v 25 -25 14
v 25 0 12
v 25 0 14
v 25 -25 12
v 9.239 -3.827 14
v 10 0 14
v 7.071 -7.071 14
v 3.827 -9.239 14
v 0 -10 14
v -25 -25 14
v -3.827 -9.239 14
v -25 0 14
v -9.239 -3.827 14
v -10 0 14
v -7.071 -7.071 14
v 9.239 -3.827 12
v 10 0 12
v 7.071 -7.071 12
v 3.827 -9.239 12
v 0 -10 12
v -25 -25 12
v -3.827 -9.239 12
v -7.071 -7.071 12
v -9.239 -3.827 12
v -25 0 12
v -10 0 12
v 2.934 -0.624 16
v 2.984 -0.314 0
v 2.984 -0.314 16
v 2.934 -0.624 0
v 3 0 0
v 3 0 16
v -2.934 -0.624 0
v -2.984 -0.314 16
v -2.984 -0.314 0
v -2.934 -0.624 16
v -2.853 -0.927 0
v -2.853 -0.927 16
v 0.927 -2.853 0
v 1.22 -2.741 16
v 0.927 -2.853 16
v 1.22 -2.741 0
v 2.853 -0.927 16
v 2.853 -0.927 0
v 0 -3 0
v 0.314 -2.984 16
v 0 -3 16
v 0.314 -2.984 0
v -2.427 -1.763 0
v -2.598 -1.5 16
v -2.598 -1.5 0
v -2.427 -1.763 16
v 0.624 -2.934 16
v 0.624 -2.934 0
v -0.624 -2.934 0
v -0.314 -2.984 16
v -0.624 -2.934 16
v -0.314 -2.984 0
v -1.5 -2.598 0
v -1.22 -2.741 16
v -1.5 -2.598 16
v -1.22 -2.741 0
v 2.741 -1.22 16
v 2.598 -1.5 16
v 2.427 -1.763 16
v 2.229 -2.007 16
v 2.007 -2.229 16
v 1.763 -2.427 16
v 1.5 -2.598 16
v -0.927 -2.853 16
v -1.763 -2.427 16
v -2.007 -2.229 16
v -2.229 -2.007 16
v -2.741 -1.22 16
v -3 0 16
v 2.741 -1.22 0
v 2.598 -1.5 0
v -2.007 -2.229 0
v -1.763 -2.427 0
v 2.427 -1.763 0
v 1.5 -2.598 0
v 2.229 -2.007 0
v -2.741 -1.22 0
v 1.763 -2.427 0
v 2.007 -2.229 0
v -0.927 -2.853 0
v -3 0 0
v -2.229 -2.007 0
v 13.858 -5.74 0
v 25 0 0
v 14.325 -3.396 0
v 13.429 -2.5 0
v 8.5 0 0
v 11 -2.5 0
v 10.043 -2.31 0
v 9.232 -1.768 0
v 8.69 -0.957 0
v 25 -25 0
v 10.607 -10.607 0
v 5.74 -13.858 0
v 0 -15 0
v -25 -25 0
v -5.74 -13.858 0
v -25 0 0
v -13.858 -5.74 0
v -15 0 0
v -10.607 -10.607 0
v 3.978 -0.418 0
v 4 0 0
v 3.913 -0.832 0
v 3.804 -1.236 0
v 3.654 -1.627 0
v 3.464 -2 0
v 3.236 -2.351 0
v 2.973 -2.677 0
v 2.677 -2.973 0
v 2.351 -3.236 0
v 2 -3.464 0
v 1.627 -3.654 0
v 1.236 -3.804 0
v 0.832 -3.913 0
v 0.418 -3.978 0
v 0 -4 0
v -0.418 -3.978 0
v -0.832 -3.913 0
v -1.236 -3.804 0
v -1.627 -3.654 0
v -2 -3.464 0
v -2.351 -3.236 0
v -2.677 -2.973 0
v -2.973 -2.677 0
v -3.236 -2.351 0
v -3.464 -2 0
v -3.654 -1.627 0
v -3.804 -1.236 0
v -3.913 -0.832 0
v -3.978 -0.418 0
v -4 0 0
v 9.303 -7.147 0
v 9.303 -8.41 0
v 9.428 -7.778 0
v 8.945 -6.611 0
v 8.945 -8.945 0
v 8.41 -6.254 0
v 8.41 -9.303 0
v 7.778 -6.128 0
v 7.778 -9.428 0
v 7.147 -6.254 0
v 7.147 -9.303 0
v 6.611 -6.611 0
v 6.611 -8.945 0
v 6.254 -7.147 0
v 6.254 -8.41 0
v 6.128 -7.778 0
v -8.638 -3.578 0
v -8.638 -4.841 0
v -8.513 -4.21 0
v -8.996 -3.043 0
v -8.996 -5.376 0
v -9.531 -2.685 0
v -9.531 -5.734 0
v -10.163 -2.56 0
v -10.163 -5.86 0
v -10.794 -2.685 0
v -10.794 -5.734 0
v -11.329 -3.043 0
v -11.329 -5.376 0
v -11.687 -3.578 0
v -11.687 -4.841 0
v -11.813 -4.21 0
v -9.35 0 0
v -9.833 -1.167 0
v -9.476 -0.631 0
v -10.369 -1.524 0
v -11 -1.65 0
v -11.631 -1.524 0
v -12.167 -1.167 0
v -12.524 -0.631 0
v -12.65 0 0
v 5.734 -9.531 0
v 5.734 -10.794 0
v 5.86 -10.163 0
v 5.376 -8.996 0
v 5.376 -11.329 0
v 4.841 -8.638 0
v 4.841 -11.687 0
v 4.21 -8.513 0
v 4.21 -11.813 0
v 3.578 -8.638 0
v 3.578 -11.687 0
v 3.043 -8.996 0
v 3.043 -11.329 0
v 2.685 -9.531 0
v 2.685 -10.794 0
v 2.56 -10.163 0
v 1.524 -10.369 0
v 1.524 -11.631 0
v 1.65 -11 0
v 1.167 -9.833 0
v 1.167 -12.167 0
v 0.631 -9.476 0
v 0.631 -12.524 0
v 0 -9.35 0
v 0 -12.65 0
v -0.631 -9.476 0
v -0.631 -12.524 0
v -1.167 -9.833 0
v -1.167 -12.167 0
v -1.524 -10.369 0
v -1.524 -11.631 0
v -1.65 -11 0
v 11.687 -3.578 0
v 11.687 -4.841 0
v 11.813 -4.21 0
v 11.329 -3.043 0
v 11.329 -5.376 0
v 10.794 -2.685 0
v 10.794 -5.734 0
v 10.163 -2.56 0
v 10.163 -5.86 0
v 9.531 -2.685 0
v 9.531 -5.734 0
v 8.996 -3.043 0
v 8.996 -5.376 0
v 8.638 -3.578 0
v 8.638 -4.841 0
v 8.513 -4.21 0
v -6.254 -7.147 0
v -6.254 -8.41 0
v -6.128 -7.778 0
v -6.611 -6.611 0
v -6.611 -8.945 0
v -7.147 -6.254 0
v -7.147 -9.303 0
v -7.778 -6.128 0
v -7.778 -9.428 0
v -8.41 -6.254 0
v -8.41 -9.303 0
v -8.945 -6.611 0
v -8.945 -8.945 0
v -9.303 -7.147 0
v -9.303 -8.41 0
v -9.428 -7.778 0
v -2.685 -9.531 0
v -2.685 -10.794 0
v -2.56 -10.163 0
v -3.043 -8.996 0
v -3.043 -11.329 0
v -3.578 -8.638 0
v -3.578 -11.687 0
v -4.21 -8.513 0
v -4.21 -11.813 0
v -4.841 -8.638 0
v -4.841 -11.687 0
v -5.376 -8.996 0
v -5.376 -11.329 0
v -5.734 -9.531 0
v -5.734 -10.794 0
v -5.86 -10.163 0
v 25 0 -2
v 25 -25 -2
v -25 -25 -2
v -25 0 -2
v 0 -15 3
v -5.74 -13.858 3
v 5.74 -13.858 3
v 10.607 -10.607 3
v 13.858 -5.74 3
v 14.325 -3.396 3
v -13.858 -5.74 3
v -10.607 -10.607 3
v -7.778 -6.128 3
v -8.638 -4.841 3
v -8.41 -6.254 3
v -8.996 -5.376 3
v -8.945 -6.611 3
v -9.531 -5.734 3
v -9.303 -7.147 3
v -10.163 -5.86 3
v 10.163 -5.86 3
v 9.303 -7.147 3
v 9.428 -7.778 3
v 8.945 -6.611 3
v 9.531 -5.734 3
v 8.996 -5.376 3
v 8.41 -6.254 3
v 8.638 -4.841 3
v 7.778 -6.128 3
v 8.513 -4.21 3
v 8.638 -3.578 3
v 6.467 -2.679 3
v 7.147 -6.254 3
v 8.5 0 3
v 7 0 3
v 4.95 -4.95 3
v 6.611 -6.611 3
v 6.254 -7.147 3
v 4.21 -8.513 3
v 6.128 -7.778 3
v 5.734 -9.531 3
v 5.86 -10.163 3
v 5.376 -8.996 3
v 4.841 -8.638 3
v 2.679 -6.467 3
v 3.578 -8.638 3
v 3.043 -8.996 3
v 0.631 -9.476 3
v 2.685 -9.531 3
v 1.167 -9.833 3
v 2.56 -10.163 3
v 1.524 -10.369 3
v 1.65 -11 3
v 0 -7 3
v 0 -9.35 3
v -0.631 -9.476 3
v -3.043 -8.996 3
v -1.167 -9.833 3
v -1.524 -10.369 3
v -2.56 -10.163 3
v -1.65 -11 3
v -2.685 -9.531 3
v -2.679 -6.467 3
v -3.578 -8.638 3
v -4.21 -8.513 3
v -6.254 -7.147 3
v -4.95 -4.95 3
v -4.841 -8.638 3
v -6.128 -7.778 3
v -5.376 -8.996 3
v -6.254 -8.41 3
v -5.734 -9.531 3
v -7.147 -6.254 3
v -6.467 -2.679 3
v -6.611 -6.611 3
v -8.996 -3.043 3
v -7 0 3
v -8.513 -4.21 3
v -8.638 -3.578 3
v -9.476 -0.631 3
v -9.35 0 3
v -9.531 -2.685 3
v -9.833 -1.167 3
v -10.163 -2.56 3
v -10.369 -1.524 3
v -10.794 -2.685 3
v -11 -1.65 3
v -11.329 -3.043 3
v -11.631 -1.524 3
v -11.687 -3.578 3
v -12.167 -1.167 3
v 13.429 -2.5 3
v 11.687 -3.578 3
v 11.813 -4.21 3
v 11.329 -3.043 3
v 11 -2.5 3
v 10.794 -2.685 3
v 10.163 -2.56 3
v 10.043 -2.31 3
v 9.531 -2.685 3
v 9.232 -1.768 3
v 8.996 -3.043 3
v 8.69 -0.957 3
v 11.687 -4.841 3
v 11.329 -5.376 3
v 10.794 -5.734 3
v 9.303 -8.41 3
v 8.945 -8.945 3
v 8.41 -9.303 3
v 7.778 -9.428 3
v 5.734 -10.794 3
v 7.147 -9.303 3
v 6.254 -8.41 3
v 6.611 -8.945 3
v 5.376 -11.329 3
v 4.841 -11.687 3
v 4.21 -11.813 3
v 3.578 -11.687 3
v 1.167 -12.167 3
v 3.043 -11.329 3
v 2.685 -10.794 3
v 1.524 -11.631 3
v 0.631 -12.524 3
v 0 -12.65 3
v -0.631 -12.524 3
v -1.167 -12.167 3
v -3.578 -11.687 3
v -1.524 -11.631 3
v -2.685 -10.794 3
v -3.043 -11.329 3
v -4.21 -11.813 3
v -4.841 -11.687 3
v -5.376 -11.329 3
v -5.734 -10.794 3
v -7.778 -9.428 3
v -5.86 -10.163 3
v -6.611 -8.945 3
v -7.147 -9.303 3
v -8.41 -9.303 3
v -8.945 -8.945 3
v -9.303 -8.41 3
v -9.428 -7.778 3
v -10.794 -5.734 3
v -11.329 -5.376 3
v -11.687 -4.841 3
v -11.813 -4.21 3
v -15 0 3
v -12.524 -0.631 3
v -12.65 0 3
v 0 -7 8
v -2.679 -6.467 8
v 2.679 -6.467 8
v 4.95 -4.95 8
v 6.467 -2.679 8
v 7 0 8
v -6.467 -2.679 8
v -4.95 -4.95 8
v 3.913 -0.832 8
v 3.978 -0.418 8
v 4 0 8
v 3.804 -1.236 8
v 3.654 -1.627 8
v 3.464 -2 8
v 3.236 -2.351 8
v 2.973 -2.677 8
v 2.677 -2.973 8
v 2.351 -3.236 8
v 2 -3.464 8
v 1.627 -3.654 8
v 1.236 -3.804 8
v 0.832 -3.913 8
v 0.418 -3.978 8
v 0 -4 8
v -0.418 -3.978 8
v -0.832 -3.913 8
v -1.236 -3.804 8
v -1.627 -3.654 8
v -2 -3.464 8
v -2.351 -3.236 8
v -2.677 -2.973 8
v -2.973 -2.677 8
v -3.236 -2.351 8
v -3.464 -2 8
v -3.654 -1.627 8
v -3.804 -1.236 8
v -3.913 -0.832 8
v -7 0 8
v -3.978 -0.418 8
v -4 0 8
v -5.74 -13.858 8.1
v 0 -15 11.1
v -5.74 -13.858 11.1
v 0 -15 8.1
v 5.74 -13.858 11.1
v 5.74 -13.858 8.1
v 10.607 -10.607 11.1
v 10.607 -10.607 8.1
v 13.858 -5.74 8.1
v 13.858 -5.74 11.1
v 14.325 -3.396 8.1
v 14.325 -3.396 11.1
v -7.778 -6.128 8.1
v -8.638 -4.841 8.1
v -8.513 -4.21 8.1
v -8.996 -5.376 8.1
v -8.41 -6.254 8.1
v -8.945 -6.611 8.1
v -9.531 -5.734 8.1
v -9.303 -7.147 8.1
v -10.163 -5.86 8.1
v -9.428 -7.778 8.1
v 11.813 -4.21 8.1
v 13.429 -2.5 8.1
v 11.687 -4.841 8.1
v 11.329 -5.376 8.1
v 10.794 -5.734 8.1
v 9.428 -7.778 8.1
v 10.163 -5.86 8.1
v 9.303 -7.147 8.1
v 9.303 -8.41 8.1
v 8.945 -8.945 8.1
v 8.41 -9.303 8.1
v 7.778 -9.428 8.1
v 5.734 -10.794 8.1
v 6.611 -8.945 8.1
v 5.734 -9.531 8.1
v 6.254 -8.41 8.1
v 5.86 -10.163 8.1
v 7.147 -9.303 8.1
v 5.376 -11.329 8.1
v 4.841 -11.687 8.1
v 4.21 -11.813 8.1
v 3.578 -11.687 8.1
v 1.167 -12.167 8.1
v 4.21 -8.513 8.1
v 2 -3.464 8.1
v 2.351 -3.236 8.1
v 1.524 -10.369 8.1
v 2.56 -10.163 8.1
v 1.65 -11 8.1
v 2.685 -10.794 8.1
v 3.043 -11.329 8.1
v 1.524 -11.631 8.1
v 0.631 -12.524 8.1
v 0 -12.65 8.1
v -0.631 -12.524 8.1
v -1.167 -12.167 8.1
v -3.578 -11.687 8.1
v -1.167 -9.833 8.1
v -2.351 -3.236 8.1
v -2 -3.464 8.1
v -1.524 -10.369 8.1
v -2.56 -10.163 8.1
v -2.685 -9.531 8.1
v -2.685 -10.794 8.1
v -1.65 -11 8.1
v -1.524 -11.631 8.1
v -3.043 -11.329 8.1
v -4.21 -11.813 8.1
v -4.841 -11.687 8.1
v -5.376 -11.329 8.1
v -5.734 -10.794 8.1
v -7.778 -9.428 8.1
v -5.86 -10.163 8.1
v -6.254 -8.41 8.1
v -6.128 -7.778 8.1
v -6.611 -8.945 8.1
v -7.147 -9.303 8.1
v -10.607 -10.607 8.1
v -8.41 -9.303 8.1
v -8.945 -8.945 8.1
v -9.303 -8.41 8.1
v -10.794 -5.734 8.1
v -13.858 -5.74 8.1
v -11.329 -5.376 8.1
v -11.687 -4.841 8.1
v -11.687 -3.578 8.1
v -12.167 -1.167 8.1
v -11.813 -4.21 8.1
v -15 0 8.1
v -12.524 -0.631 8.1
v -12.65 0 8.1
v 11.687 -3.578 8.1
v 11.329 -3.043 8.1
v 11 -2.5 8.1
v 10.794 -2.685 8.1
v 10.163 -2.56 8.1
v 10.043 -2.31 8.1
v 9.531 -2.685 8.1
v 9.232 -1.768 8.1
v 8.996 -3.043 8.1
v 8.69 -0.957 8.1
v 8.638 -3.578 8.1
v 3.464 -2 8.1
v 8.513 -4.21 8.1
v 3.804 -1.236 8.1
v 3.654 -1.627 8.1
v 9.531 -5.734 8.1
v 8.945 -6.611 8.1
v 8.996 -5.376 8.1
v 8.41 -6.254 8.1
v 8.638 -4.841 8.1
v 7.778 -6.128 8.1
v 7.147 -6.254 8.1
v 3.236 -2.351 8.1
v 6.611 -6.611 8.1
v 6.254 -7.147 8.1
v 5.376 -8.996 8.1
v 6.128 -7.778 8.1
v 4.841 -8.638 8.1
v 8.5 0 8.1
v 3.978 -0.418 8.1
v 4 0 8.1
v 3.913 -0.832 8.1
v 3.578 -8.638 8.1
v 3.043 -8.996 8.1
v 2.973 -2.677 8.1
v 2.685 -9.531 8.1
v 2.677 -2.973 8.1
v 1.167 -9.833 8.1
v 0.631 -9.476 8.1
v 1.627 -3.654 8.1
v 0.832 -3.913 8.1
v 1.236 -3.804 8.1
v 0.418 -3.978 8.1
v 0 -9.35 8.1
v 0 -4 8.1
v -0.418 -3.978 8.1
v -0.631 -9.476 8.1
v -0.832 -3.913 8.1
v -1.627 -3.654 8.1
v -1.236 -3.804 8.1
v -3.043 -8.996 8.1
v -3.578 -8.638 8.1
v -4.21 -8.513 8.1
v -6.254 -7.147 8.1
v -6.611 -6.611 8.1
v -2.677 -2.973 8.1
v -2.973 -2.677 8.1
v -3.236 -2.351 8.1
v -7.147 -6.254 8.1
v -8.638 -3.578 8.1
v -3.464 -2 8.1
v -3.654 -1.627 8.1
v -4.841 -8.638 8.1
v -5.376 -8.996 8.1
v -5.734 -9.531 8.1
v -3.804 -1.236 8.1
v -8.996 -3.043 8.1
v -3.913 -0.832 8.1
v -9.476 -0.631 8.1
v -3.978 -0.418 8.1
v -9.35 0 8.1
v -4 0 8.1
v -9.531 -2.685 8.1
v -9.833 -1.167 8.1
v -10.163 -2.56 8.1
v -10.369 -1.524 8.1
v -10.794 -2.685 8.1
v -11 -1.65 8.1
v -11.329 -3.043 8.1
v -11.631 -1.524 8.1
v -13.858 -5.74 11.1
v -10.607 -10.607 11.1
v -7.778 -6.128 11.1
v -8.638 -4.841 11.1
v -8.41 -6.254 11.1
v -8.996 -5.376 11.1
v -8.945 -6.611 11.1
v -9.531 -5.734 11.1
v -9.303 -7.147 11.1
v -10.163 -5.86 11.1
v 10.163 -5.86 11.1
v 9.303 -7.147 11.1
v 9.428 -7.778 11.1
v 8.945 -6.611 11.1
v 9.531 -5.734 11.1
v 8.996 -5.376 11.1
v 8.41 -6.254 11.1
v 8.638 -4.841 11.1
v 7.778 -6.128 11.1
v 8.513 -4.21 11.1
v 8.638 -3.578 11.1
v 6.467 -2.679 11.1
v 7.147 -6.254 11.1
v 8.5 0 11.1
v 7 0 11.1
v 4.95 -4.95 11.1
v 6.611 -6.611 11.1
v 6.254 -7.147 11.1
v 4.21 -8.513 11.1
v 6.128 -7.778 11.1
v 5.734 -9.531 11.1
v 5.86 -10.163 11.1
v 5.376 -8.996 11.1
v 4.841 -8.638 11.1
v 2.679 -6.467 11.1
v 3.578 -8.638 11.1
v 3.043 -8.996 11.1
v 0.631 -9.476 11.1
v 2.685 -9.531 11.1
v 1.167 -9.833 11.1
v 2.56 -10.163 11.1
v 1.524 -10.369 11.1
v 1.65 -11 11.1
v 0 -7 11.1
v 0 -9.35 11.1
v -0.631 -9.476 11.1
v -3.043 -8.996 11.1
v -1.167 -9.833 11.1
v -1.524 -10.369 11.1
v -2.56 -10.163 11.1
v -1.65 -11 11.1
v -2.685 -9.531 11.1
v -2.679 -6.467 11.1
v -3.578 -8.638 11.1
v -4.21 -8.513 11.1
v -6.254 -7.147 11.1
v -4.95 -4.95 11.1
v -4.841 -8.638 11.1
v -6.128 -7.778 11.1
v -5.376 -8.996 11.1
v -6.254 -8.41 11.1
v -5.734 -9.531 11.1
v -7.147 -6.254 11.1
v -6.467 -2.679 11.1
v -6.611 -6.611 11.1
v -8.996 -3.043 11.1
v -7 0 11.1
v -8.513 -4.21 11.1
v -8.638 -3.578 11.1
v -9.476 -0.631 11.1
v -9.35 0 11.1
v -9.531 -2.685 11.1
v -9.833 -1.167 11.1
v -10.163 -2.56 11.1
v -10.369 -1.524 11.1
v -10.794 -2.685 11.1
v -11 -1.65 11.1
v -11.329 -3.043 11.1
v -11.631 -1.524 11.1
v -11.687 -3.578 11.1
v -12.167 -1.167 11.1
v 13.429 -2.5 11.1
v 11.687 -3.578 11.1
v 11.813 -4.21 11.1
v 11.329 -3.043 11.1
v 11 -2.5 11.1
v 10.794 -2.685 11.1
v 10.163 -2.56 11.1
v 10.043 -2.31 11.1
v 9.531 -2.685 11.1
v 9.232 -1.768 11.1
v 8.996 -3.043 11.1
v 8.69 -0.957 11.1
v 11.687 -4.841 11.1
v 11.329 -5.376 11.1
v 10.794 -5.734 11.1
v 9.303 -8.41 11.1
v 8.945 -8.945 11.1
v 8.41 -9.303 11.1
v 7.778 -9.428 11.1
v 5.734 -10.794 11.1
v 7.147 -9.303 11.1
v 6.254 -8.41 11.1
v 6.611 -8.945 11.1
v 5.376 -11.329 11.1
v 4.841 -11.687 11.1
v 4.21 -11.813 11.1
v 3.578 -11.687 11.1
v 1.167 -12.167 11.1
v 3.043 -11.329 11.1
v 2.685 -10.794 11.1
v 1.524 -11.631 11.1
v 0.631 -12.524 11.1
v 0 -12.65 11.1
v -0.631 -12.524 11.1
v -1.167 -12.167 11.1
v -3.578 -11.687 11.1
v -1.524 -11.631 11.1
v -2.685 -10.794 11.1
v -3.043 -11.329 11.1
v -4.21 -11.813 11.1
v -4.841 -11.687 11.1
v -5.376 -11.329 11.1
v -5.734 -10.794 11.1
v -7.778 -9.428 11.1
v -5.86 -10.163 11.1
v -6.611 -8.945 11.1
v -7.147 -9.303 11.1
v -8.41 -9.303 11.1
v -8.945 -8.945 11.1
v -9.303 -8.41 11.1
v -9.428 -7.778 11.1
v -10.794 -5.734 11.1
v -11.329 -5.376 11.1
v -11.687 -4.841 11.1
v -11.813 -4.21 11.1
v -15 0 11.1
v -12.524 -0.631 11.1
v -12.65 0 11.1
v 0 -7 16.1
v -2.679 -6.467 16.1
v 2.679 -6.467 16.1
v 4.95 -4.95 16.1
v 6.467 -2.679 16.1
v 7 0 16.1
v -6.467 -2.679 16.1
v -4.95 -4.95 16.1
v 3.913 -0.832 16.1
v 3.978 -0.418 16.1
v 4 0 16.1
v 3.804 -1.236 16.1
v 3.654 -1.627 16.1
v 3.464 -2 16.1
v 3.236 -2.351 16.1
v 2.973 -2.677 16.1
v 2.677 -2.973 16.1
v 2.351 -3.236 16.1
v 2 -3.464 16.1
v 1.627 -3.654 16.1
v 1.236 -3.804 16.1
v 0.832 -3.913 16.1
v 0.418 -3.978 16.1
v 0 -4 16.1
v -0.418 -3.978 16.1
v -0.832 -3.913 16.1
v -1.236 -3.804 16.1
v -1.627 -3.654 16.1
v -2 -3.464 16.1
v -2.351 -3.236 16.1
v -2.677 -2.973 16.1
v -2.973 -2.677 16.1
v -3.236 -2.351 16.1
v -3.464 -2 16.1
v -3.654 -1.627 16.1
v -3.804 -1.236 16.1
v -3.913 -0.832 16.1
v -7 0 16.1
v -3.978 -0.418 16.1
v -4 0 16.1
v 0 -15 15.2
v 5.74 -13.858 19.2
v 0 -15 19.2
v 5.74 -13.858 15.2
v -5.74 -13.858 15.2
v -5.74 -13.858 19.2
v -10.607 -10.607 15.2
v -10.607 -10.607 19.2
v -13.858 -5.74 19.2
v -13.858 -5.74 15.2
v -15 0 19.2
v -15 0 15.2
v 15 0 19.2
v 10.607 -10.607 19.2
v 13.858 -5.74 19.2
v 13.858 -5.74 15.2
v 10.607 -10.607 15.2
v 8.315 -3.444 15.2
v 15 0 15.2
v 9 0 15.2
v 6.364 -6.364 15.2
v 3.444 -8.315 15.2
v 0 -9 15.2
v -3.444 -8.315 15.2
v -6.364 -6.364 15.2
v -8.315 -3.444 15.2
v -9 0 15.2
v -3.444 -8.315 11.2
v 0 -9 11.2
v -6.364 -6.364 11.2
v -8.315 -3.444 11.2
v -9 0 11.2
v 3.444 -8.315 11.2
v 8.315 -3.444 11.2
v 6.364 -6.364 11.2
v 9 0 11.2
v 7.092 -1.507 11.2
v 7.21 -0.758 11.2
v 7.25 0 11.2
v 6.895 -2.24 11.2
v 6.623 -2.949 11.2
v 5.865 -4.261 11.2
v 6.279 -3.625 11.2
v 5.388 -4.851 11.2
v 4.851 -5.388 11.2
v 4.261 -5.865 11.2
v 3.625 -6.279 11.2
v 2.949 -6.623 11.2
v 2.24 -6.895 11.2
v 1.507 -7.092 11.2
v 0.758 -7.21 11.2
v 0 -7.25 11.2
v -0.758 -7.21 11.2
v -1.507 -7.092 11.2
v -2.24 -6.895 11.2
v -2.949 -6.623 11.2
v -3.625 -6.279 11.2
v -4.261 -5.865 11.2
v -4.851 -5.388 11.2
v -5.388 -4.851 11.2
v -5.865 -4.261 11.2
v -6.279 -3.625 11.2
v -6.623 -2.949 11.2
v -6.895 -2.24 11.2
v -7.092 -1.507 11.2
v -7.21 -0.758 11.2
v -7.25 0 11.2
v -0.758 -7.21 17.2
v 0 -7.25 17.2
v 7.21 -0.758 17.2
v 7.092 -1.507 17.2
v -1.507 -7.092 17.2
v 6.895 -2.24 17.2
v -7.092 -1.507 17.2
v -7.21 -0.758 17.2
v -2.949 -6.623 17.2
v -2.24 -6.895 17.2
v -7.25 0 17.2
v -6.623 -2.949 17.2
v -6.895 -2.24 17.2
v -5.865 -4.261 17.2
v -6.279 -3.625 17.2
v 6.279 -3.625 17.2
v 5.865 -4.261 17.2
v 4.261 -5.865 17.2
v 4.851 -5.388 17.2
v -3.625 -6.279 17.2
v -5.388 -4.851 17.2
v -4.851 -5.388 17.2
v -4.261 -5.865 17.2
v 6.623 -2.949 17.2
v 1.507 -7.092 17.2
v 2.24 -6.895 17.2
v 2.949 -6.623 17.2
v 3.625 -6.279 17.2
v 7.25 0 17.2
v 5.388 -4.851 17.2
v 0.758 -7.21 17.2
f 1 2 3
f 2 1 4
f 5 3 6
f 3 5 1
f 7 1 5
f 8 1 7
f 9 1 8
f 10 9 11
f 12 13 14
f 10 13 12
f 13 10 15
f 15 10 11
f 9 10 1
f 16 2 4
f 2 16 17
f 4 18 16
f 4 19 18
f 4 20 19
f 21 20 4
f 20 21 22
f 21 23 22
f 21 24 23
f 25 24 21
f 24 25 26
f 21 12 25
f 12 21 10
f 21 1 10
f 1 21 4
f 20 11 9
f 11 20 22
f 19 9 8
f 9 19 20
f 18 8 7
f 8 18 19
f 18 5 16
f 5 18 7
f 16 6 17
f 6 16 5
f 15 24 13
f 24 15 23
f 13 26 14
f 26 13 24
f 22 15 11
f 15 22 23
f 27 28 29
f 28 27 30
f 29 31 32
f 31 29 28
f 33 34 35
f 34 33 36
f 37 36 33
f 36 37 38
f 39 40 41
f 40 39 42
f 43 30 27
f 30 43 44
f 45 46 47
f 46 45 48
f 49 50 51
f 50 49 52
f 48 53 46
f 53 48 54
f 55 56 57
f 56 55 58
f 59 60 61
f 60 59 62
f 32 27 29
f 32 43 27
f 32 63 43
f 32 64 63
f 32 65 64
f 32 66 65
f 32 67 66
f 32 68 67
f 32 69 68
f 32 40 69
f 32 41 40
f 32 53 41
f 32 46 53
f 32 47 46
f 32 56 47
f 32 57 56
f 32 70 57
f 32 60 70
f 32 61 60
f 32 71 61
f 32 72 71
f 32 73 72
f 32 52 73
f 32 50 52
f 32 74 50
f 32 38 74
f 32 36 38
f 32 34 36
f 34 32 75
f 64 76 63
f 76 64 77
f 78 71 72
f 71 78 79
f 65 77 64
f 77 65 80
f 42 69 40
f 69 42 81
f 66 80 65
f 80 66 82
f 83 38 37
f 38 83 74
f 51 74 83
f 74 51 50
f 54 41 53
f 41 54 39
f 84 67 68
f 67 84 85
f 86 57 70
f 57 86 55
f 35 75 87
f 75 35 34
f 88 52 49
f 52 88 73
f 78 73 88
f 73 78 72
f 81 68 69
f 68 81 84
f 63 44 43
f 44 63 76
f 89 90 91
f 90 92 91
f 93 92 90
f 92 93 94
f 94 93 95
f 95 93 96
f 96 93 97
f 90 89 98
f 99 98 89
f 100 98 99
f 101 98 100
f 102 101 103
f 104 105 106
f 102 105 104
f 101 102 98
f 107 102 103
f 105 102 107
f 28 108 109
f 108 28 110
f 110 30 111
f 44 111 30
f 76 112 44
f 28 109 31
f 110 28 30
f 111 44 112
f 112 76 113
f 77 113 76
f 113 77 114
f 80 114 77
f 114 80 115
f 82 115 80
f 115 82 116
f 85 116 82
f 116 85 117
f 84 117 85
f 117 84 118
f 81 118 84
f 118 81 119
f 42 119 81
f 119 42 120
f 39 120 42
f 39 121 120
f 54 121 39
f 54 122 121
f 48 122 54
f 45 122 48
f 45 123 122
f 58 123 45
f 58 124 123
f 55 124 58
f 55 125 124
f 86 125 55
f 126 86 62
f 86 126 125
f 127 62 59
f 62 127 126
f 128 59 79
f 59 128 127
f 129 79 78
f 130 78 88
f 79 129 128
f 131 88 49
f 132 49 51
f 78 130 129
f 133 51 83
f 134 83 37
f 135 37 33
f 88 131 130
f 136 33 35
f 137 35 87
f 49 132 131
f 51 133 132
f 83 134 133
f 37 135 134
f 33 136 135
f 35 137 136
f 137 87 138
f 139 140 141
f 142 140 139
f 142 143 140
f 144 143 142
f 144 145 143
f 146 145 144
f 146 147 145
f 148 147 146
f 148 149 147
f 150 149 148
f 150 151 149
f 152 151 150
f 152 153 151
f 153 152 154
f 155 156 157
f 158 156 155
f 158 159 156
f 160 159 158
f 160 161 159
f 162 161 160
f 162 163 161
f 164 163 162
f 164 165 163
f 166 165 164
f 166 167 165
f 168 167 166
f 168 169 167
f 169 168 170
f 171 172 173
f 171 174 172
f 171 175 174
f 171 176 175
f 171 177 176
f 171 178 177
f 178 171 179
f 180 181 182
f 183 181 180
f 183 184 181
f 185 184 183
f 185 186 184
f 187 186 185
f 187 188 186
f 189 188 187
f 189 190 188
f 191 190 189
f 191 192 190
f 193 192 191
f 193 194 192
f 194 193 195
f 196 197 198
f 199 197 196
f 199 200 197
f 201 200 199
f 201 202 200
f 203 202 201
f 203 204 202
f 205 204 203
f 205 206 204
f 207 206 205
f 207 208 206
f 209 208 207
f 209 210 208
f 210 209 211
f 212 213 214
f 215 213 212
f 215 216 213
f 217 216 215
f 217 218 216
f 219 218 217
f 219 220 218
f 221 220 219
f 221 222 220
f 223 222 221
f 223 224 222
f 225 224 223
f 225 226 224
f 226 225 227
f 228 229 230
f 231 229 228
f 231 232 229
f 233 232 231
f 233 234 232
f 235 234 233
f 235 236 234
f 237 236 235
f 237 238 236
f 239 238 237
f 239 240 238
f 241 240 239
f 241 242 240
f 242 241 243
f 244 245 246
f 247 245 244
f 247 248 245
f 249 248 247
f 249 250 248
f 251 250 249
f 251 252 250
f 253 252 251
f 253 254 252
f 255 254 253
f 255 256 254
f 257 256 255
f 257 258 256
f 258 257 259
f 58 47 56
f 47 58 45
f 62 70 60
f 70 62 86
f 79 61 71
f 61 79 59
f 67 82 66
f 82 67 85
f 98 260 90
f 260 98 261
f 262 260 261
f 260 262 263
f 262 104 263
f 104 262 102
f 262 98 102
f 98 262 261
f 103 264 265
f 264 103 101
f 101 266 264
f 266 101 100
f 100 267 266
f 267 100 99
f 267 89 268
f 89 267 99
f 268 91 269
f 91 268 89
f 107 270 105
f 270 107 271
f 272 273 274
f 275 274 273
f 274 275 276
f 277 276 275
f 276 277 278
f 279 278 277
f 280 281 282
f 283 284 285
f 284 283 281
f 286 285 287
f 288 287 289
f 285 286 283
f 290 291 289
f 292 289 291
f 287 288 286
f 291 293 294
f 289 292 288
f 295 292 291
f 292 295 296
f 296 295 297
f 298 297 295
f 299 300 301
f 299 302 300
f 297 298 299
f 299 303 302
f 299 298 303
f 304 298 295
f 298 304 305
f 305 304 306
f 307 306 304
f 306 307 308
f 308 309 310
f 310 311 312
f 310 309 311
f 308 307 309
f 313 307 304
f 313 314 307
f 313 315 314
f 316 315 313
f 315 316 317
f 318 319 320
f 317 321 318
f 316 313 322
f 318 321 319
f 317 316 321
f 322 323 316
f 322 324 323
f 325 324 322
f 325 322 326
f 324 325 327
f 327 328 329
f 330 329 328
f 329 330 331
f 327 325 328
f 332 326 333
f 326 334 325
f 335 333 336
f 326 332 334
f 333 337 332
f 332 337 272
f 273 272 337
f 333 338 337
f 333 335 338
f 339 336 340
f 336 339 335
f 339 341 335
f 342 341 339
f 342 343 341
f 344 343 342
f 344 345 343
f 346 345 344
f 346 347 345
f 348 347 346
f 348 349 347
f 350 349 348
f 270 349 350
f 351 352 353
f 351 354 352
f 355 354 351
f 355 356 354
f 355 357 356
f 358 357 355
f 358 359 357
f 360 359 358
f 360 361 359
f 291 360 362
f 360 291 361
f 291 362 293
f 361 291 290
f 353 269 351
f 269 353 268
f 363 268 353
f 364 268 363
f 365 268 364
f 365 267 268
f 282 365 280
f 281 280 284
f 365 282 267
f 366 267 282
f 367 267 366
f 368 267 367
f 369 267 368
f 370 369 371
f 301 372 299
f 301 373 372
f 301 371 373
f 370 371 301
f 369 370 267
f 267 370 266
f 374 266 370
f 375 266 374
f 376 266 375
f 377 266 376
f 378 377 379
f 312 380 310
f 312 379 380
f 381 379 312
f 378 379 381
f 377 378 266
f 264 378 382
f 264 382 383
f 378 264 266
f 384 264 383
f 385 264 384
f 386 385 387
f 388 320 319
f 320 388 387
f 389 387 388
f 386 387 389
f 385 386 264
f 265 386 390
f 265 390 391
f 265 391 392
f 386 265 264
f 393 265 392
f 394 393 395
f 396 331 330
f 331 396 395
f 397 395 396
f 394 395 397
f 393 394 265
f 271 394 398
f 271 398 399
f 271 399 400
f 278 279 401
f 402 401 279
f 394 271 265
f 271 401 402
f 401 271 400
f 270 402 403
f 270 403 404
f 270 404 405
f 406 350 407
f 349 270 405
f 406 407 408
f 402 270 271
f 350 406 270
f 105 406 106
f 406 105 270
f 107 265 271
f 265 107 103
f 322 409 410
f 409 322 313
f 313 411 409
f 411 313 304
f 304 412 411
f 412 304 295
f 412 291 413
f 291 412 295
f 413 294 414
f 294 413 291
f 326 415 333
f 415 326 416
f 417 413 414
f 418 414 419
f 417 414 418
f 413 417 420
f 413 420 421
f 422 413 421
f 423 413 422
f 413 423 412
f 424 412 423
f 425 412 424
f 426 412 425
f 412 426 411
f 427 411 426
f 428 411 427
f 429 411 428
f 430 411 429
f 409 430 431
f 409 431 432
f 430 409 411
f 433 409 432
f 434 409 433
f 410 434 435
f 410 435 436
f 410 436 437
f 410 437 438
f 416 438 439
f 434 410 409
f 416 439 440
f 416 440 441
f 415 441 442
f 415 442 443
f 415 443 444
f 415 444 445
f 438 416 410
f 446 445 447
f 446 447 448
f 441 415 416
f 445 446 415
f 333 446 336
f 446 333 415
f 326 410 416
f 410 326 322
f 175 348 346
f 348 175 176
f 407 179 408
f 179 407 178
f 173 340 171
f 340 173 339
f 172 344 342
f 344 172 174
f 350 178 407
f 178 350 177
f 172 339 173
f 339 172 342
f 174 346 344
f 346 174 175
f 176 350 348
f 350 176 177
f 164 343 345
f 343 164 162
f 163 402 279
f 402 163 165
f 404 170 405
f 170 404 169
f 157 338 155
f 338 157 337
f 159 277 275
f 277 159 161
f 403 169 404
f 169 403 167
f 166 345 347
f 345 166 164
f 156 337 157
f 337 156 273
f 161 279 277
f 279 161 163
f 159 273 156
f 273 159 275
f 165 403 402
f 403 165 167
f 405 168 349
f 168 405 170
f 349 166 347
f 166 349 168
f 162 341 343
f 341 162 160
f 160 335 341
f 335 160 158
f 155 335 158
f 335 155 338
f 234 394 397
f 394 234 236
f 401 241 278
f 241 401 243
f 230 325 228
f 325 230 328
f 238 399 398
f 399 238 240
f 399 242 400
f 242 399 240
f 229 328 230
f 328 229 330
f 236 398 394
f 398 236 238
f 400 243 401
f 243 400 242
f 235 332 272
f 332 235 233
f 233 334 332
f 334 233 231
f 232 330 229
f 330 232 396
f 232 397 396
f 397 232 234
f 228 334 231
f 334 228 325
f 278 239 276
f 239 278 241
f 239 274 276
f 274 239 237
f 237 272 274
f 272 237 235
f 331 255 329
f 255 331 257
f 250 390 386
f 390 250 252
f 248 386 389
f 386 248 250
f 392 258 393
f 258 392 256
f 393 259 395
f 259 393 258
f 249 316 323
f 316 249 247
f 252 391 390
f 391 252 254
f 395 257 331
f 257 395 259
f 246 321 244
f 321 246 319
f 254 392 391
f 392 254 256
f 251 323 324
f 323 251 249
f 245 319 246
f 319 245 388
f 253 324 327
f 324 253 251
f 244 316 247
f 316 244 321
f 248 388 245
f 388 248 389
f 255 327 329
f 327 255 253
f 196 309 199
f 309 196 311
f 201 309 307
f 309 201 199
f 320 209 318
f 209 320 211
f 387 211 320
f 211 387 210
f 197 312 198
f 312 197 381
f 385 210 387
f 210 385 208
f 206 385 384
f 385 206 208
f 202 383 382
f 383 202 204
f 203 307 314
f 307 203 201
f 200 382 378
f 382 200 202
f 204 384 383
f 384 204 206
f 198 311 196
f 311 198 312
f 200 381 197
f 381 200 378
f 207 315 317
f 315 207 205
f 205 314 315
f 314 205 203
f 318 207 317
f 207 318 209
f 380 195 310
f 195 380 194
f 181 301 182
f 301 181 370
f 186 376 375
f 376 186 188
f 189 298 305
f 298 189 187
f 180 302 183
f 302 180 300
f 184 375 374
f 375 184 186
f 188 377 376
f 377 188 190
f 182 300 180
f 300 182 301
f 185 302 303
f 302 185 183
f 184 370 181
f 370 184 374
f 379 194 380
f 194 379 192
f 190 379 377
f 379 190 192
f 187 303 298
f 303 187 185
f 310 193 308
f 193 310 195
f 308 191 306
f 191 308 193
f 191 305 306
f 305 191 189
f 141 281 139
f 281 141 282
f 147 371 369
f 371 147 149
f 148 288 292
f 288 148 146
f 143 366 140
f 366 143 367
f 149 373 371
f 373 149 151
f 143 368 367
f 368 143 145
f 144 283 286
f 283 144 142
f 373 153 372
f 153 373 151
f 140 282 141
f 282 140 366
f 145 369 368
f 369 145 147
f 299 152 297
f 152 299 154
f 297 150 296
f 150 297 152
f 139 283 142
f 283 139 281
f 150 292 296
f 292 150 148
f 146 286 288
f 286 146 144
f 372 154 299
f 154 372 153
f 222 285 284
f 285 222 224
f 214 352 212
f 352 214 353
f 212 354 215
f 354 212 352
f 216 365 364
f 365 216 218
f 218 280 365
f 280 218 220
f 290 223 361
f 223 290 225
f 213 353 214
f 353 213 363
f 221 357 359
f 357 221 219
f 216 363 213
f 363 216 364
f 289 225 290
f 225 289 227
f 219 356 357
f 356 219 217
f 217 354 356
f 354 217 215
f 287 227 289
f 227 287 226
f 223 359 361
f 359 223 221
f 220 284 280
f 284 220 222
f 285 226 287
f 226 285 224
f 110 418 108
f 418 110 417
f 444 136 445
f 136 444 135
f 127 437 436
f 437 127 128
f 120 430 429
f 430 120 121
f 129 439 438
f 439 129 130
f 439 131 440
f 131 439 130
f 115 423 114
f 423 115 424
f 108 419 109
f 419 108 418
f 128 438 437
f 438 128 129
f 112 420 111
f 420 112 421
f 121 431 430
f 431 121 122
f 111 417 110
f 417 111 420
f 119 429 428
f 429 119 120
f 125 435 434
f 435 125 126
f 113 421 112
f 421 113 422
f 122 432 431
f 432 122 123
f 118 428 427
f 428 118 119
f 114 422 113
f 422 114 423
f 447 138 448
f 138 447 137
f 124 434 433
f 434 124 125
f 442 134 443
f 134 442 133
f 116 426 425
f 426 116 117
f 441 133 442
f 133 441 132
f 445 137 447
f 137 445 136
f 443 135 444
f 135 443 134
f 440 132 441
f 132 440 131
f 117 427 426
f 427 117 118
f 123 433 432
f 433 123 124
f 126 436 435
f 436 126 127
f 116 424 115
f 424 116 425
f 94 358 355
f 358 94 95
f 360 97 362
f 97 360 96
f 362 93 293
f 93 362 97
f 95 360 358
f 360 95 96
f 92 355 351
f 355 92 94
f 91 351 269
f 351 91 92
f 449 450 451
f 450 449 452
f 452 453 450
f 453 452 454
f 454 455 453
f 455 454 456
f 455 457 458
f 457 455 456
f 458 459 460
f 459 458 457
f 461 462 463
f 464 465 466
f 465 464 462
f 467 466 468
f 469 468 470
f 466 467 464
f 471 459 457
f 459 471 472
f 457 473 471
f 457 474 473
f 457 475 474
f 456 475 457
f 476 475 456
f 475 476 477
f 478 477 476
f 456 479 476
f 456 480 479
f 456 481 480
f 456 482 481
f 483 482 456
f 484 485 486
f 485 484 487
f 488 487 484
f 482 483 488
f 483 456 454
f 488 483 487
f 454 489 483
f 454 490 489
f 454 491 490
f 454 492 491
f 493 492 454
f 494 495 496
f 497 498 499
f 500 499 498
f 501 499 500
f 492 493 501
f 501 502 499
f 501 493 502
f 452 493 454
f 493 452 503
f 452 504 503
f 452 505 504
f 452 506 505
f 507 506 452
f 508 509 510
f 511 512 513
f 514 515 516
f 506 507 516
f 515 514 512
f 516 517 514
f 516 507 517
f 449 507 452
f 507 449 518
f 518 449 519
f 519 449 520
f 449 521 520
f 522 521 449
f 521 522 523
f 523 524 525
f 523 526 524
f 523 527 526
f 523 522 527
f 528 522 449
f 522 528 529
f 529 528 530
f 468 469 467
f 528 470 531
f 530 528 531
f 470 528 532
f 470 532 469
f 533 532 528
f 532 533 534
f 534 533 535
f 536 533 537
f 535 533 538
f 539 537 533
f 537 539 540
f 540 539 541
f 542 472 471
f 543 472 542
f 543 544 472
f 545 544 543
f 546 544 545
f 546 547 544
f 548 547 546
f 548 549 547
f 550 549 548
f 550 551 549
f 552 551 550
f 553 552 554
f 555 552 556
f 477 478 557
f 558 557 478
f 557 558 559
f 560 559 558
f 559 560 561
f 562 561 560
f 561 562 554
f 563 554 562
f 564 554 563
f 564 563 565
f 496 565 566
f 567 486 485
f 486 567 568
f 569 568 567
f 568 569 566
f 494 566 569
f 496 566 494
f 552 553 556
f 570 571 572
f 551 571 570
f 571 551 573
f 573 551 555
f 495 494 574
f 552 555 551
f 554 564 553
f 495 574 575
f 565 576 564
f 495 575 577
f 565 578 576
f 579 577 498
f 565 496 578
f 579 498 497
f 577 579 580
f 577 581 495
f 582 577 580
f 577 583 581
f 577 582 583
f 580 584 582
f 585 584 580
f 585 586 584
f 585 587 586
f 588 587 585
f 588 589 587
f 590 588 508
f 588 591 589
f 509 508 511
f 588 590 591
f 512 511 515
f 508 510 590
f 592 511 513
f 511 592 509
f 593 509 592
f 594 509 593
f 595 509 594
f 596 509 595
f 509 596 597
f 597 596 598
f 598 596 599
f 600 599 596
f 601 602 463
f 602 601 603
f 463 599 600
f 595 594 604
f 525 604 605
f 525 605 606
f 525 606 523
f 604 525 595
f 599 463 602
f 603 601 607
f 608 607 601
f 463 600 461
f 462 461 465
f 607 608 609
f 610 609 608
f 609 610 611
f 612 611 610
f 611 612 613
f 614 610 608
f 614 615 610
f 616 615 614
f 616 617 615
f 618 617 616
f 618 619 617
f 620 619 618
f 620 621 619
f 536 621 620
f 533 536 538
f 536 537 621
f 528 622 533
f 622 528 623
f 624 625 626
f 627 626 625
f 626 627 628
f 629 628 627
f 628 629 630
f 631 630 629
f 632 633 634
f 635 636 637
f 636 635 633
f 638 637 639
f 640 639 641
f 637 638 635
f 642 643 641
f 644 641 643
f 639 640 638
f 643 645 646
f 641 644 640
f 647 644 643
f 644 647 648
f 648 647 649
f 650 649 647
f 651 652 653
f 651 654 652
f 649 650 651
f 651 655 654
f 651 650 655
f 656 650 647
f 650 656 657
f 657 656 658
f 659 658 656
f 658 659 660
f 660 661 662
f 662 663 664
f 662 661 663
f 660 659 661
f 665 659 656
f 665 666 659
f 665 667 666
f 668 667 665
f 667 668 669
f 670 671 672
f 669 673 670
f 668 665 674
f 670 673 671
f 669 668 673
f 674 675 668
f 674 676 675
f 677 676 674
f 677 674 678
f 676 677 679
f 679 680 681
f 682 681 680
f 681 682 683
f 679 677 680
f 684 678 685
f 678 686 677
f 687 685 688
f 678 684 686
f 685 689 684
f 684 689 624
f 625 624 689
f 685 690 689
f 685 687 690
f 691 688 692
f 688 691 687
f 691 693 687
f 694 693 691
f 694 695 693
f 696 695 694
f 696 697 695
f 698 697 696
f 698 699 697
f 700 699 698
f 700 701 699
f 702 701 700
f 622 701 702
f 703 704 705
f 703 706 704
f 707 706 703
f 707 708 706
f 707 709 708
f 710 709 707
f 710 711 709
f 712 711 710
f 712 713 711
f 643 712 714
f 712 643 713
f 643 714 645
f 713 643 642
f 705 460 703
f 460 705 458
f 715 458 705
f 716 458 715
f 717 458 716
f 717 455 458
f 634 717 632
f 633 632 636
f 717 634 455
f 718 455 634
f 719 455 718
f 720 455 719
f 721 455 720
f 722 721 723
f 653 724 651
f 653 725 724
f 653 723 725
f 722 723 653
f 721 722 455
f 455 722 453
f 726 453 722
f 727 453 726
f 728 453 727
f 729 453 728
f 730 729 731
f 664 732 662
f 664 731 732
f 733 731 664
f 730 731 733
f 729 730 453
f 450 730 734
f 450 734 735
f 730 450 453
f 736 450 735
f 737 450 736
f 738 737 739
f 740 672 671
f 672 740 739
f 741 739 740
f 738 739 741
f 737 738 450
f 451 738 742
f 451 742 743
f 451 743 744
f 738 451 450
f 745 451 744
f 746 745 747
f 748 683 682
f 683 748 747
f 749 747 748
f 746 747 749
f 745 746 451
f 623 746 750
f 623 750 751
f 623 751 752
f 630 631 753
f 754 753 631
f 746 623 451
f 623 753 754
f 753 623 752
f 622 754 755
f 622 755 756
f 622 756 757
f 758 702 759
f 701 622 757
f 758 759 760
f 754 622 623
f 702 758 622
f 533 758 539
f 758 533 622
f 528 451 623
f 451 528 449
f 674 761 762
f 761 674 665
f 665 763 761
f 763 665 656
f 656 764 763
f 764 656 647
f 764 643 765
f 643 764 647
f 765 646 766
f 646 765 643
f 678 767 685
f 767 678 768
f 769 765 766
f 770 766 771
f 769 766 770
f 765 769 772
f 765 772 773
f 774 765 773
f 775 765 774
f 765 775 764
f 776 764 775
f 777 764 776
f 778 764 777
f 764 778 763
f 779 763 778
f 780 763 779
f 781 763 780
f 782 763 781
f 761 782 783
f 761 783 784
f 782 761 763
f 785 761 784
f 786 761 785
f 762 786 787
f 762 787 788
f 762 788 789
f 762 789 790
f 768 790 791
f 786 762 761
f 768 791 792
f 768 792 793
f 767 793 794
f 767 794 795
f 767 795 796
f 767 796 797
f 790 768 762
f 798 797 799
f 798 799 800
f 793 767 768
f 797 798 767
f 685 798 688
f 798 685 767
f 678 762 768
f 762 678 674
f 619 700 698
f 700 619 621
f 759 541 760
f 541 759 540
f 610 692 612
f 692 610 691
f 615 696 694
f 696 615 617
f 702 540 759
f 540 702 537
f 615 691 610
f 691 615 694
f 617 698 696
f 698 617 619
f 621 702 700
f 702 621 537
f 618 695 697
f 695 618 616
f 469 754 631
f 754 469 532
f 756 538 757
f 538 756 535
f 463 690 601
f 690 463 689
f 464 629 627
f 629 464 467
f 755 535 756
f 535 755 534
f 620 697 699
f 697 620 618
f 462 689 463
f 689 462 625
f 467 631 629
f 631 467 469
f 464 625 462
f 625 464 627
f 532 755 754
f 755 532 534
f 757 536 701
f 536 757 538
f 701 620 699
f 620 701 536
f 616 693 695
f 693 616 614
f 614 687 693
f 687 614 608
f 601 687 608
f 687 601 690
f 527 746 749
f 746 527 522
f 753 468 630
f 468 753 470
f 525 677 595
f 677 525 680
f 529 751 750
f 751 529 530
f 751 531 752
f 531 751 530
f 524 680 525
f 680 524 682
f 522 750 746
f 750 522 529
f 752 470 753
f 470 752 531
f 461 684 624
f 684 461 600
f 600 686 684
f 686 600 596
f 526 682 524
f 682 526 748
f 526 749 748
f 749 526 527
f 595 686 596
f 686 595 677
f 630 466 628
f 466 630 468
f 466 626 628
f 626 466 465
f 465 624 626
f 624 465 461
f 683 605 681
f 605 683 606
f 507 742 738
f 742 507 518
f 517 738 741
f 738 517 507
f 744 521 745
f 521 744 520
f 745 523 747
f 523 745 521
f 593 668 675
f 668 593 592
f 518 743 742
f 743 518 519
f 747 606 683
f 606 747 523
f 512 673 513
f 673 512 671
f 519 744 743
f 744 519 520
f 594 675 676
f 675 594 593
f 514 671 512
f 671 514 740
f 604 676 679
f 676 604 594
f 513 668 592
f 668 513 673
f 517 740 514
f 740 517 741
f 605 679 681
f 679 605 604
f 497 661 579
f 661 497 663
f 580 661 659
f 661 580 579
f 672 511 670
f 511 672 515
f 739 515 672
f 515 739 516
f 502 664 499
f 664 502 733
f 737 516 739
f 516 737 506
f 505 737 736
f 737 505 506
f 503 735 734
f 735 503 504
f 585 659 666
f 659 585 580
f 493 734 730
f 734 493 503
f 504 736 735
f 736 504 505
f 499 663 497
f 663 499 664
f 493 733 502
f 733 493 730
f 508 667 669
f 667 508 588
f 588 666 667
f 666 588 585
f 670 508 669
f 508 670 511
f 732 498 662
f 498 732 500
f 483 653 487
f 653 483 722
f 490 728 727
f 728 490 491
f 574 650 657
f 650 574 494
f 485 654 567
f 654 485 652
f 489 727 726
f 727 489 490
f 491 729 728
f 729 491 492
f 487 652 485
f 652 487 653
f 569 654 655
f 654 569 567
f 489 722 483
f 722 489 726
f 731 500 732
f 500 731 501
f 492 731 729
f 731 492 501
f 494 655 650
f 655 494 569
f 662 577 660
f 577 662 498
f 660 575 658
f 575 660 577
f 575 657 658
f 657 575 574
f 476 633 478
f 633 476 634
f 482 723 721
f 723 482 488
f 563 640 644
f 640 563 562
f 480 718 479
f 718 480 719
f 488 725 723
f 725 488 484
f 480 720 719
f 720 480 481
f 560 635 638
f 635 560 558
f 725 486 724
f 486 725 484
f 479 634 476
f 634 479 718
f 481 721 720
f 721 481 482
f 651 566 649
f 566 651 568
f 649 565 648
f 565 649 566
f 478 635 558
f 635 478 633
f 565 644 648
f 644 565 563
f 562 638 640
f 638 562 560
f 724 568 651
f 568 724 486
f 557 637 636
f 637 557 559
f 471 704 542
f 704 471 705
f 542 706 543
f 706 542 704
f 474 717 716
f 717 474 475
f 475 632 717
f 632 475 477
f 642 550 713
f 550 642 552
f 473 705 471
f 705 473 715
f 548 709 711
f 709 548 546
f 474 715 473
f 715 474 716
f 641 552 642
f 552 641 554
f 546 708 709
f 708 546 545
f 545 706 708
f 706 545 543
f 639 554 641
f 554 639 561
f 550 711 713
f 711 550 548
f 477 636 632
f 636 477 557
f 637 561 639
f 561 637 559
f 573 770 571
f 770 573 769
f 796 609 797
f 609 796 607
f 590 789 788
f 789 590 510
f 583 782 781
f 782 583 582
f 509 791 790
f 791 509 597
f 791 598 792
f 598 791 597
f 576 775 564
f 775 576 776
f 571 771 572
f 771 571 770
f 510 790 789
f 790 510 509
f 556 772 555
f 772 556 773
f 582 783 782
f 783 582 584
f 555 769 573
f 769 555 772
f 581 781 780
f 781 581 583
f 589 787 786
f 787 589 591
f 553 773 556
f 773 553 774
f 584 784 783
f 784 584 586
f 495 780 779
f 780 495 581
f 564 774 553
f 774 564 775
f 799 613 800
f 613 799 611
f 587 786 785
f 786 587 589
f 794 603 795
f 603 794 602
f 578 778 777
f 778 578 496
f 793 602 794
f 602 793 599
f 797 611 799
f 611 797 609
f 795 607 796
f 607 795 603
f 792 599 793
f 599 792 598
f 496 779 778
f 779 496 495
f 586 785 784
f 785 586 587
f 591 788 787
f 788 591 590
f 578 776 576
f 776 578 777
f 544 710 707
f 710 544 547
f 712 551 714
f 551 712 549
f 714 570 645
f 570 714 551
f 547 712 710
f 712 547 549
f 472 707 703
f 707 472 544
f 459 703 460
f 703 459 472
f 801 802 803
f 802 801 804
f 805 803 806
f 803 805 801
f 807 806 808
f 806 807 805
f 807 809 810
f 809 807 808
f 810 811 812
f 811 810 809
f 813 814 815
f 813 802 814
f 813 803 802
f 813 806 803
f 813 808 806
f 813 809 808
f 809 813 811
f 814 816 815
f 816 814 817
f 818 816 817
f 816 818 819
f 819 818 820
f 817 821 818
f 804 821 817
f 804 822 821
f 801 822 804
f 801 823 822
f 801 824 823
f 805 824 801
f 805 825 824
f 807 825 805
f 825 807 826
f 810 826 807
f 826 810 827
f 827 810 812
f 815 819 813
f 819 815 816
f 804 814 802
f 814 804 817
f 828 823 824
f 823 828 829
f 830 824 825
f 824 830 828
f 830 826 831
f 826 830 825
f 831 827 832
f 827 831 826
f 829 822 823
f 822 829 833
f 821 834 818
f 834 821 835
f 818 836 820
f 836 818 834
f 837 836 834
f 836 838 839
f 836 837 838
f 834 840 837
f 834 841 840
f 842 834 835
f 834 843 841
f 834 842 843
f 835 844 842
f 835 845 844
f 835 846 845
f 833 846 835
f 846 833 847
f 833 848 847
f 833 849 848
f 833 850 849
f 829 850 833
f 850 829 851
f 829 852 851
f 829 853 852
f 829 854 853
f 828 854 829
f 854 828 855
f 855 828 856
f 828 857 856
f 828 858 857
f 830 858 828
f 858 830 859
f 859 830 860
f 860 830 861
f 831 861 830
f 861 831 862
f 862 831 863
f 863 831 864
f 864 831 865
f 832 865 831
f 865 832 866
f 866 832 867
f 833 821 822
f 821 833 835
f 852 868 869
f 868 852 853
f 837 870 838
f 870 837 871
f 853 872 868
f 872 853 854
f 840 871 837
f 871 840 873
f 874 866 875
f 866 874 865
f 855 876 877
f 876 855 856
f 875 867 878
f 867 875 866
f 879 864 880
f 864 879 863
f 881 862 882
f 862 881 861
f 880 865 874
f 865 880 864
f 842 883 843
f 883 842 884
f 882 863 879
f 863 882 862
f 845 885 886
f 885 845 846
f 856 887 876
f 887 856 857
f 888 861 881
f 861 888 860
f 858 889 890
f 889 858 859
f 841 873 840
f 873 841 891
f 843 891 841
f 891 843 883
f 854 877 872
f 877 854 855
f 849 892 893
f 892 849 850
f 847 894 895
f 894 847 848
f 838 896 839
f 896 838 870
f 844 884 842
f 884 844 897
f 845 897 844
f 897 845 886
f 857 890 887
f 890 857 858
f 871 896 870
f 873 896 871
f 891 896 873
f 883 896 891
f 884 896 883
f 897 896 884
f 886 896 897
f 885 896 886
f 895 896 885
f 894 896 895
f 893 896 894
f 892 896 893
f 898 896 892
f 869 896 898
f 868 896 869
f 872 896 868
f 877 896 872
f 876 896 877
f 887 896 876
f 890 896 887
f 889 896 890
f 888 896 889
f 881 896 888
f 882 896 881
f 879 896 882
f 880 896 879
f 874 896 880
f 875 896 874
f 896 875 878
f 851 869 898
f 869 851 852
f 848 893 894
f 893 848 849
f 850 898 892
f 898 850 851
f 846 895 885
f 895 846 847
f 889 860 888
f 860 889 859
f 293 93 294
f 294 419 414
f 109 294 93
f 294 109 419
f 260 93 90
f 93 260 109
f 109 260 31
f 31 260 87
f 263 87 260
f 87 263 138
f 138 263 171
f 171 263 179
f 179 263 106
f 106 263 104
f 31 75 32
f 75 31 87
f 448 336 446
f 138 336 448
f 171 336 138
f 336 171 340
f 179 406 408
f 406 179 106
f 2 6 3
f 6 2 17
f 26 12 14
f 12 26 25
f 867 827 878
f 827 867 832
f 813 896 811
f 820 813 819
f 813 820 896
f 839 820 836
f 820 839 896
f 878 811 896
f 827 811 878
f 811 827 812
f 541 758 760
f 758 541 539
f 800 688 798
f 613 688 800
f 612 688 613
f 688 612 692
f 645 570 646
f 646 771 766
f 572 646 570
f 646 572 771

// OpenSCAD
// file: configure.scad
rotor_d = 30;
rotor_thickness = 3;
rotor_distance = 5;
total_numbers = 16;
spindle_d = 6;
sleeve_d = 14;
// file: rotor.scad
include <../../lib/relativity.scad> // https://github.com/davidson16807/relativity.scad
include <configure.scad>

$fn=16;

module rotor() {
  hole_offset = 11;

  differed("hole", "not(hole)") {
    rod(d=rotor_d, h=rotor_thickness, anchor=bottom, $fn=total_numbers) {
      align(bottom) {
        rod(d=spindle_d+2, h=rotor_distance+rotor_thickness+1, anchor=bottom, $class="hole", $fn=60);
        rotated(z*360/total_numbers, n=[1:total_numbers])
          translated(x*hole_offset)
            rod(d=3.3, h=rotor_thickness+1, anchor=bottom, $class="hole");
      }
      align(top)
        rod(d=sleeve_d, h=rotor_distance, anchor=bottom);
      // notch
      align(bottom) translated(x*hole_offset)
        rod(d=5, h=rotor_thickness+1, anchor=-z, $class="hole")
          box([10,5,rotor_thickness+1], anchor=-x, $class="hole");
    }
    // notch
    translated(x*(rotor_d/2+3)) 
      orient(x+y)
        box([10,10,10], $class="hole");
  }
}

module dial() {
  differed("hole", "not(hole)") {
    rod(d=rotor_d, h=4, anchor=bottom, $fn=total_numbers) {
      align(top)
        rod(d=sleeve_d+4, h=4, anchor=bottom)
          align(top)
            rod(d=sleeve_d+0.5, h=6, anchor=top, $class="hole", $fn=60);
    }
  }
}

// rotor();

// translated(z*20)
// orient(-z)
// dial();
// file: body.scad
include <../../lib/relativity.scad> // https://github.com/davidson16807/relativity.scad
include <configure.scad>

$fn=16;

module bottom_case() {
  box([50,50,2], anchor=top)
    align(top) {
      rod(d=spindle_d, h=(rotor_distance+rotor_thickness)*2, anchor=bottom, $fn=60);
      children();
    }
}

module top_case() {
  differed("hole", "not(hole)")
    box([50,50,2], anchor=bottom)
      align(bottom) 
        rod(d=sleeve_d+6, h=3, anchor=bottom, $class="hole");
}

module case() {
  colored("lightblue") {
    bottom_case()
    translated(z*(rotor_thickness*2+rotor_distance+1))
    top_case();
  }
}

// case();
// main file
include <body.scad>
include <rotor.scad>

module layer(n) {
  translate(z*(rotor_distance+rotor_thickness+0.1)*n)
  children();
}

intersected("cut", "not(cut)") {
  box([100, 100, 100], anchor=y, $class="cut");
  case();
  layer(0) rotor();
  layer(1) rotor();
  layer(2) translated(z*3) orient(-z) dial();
}
